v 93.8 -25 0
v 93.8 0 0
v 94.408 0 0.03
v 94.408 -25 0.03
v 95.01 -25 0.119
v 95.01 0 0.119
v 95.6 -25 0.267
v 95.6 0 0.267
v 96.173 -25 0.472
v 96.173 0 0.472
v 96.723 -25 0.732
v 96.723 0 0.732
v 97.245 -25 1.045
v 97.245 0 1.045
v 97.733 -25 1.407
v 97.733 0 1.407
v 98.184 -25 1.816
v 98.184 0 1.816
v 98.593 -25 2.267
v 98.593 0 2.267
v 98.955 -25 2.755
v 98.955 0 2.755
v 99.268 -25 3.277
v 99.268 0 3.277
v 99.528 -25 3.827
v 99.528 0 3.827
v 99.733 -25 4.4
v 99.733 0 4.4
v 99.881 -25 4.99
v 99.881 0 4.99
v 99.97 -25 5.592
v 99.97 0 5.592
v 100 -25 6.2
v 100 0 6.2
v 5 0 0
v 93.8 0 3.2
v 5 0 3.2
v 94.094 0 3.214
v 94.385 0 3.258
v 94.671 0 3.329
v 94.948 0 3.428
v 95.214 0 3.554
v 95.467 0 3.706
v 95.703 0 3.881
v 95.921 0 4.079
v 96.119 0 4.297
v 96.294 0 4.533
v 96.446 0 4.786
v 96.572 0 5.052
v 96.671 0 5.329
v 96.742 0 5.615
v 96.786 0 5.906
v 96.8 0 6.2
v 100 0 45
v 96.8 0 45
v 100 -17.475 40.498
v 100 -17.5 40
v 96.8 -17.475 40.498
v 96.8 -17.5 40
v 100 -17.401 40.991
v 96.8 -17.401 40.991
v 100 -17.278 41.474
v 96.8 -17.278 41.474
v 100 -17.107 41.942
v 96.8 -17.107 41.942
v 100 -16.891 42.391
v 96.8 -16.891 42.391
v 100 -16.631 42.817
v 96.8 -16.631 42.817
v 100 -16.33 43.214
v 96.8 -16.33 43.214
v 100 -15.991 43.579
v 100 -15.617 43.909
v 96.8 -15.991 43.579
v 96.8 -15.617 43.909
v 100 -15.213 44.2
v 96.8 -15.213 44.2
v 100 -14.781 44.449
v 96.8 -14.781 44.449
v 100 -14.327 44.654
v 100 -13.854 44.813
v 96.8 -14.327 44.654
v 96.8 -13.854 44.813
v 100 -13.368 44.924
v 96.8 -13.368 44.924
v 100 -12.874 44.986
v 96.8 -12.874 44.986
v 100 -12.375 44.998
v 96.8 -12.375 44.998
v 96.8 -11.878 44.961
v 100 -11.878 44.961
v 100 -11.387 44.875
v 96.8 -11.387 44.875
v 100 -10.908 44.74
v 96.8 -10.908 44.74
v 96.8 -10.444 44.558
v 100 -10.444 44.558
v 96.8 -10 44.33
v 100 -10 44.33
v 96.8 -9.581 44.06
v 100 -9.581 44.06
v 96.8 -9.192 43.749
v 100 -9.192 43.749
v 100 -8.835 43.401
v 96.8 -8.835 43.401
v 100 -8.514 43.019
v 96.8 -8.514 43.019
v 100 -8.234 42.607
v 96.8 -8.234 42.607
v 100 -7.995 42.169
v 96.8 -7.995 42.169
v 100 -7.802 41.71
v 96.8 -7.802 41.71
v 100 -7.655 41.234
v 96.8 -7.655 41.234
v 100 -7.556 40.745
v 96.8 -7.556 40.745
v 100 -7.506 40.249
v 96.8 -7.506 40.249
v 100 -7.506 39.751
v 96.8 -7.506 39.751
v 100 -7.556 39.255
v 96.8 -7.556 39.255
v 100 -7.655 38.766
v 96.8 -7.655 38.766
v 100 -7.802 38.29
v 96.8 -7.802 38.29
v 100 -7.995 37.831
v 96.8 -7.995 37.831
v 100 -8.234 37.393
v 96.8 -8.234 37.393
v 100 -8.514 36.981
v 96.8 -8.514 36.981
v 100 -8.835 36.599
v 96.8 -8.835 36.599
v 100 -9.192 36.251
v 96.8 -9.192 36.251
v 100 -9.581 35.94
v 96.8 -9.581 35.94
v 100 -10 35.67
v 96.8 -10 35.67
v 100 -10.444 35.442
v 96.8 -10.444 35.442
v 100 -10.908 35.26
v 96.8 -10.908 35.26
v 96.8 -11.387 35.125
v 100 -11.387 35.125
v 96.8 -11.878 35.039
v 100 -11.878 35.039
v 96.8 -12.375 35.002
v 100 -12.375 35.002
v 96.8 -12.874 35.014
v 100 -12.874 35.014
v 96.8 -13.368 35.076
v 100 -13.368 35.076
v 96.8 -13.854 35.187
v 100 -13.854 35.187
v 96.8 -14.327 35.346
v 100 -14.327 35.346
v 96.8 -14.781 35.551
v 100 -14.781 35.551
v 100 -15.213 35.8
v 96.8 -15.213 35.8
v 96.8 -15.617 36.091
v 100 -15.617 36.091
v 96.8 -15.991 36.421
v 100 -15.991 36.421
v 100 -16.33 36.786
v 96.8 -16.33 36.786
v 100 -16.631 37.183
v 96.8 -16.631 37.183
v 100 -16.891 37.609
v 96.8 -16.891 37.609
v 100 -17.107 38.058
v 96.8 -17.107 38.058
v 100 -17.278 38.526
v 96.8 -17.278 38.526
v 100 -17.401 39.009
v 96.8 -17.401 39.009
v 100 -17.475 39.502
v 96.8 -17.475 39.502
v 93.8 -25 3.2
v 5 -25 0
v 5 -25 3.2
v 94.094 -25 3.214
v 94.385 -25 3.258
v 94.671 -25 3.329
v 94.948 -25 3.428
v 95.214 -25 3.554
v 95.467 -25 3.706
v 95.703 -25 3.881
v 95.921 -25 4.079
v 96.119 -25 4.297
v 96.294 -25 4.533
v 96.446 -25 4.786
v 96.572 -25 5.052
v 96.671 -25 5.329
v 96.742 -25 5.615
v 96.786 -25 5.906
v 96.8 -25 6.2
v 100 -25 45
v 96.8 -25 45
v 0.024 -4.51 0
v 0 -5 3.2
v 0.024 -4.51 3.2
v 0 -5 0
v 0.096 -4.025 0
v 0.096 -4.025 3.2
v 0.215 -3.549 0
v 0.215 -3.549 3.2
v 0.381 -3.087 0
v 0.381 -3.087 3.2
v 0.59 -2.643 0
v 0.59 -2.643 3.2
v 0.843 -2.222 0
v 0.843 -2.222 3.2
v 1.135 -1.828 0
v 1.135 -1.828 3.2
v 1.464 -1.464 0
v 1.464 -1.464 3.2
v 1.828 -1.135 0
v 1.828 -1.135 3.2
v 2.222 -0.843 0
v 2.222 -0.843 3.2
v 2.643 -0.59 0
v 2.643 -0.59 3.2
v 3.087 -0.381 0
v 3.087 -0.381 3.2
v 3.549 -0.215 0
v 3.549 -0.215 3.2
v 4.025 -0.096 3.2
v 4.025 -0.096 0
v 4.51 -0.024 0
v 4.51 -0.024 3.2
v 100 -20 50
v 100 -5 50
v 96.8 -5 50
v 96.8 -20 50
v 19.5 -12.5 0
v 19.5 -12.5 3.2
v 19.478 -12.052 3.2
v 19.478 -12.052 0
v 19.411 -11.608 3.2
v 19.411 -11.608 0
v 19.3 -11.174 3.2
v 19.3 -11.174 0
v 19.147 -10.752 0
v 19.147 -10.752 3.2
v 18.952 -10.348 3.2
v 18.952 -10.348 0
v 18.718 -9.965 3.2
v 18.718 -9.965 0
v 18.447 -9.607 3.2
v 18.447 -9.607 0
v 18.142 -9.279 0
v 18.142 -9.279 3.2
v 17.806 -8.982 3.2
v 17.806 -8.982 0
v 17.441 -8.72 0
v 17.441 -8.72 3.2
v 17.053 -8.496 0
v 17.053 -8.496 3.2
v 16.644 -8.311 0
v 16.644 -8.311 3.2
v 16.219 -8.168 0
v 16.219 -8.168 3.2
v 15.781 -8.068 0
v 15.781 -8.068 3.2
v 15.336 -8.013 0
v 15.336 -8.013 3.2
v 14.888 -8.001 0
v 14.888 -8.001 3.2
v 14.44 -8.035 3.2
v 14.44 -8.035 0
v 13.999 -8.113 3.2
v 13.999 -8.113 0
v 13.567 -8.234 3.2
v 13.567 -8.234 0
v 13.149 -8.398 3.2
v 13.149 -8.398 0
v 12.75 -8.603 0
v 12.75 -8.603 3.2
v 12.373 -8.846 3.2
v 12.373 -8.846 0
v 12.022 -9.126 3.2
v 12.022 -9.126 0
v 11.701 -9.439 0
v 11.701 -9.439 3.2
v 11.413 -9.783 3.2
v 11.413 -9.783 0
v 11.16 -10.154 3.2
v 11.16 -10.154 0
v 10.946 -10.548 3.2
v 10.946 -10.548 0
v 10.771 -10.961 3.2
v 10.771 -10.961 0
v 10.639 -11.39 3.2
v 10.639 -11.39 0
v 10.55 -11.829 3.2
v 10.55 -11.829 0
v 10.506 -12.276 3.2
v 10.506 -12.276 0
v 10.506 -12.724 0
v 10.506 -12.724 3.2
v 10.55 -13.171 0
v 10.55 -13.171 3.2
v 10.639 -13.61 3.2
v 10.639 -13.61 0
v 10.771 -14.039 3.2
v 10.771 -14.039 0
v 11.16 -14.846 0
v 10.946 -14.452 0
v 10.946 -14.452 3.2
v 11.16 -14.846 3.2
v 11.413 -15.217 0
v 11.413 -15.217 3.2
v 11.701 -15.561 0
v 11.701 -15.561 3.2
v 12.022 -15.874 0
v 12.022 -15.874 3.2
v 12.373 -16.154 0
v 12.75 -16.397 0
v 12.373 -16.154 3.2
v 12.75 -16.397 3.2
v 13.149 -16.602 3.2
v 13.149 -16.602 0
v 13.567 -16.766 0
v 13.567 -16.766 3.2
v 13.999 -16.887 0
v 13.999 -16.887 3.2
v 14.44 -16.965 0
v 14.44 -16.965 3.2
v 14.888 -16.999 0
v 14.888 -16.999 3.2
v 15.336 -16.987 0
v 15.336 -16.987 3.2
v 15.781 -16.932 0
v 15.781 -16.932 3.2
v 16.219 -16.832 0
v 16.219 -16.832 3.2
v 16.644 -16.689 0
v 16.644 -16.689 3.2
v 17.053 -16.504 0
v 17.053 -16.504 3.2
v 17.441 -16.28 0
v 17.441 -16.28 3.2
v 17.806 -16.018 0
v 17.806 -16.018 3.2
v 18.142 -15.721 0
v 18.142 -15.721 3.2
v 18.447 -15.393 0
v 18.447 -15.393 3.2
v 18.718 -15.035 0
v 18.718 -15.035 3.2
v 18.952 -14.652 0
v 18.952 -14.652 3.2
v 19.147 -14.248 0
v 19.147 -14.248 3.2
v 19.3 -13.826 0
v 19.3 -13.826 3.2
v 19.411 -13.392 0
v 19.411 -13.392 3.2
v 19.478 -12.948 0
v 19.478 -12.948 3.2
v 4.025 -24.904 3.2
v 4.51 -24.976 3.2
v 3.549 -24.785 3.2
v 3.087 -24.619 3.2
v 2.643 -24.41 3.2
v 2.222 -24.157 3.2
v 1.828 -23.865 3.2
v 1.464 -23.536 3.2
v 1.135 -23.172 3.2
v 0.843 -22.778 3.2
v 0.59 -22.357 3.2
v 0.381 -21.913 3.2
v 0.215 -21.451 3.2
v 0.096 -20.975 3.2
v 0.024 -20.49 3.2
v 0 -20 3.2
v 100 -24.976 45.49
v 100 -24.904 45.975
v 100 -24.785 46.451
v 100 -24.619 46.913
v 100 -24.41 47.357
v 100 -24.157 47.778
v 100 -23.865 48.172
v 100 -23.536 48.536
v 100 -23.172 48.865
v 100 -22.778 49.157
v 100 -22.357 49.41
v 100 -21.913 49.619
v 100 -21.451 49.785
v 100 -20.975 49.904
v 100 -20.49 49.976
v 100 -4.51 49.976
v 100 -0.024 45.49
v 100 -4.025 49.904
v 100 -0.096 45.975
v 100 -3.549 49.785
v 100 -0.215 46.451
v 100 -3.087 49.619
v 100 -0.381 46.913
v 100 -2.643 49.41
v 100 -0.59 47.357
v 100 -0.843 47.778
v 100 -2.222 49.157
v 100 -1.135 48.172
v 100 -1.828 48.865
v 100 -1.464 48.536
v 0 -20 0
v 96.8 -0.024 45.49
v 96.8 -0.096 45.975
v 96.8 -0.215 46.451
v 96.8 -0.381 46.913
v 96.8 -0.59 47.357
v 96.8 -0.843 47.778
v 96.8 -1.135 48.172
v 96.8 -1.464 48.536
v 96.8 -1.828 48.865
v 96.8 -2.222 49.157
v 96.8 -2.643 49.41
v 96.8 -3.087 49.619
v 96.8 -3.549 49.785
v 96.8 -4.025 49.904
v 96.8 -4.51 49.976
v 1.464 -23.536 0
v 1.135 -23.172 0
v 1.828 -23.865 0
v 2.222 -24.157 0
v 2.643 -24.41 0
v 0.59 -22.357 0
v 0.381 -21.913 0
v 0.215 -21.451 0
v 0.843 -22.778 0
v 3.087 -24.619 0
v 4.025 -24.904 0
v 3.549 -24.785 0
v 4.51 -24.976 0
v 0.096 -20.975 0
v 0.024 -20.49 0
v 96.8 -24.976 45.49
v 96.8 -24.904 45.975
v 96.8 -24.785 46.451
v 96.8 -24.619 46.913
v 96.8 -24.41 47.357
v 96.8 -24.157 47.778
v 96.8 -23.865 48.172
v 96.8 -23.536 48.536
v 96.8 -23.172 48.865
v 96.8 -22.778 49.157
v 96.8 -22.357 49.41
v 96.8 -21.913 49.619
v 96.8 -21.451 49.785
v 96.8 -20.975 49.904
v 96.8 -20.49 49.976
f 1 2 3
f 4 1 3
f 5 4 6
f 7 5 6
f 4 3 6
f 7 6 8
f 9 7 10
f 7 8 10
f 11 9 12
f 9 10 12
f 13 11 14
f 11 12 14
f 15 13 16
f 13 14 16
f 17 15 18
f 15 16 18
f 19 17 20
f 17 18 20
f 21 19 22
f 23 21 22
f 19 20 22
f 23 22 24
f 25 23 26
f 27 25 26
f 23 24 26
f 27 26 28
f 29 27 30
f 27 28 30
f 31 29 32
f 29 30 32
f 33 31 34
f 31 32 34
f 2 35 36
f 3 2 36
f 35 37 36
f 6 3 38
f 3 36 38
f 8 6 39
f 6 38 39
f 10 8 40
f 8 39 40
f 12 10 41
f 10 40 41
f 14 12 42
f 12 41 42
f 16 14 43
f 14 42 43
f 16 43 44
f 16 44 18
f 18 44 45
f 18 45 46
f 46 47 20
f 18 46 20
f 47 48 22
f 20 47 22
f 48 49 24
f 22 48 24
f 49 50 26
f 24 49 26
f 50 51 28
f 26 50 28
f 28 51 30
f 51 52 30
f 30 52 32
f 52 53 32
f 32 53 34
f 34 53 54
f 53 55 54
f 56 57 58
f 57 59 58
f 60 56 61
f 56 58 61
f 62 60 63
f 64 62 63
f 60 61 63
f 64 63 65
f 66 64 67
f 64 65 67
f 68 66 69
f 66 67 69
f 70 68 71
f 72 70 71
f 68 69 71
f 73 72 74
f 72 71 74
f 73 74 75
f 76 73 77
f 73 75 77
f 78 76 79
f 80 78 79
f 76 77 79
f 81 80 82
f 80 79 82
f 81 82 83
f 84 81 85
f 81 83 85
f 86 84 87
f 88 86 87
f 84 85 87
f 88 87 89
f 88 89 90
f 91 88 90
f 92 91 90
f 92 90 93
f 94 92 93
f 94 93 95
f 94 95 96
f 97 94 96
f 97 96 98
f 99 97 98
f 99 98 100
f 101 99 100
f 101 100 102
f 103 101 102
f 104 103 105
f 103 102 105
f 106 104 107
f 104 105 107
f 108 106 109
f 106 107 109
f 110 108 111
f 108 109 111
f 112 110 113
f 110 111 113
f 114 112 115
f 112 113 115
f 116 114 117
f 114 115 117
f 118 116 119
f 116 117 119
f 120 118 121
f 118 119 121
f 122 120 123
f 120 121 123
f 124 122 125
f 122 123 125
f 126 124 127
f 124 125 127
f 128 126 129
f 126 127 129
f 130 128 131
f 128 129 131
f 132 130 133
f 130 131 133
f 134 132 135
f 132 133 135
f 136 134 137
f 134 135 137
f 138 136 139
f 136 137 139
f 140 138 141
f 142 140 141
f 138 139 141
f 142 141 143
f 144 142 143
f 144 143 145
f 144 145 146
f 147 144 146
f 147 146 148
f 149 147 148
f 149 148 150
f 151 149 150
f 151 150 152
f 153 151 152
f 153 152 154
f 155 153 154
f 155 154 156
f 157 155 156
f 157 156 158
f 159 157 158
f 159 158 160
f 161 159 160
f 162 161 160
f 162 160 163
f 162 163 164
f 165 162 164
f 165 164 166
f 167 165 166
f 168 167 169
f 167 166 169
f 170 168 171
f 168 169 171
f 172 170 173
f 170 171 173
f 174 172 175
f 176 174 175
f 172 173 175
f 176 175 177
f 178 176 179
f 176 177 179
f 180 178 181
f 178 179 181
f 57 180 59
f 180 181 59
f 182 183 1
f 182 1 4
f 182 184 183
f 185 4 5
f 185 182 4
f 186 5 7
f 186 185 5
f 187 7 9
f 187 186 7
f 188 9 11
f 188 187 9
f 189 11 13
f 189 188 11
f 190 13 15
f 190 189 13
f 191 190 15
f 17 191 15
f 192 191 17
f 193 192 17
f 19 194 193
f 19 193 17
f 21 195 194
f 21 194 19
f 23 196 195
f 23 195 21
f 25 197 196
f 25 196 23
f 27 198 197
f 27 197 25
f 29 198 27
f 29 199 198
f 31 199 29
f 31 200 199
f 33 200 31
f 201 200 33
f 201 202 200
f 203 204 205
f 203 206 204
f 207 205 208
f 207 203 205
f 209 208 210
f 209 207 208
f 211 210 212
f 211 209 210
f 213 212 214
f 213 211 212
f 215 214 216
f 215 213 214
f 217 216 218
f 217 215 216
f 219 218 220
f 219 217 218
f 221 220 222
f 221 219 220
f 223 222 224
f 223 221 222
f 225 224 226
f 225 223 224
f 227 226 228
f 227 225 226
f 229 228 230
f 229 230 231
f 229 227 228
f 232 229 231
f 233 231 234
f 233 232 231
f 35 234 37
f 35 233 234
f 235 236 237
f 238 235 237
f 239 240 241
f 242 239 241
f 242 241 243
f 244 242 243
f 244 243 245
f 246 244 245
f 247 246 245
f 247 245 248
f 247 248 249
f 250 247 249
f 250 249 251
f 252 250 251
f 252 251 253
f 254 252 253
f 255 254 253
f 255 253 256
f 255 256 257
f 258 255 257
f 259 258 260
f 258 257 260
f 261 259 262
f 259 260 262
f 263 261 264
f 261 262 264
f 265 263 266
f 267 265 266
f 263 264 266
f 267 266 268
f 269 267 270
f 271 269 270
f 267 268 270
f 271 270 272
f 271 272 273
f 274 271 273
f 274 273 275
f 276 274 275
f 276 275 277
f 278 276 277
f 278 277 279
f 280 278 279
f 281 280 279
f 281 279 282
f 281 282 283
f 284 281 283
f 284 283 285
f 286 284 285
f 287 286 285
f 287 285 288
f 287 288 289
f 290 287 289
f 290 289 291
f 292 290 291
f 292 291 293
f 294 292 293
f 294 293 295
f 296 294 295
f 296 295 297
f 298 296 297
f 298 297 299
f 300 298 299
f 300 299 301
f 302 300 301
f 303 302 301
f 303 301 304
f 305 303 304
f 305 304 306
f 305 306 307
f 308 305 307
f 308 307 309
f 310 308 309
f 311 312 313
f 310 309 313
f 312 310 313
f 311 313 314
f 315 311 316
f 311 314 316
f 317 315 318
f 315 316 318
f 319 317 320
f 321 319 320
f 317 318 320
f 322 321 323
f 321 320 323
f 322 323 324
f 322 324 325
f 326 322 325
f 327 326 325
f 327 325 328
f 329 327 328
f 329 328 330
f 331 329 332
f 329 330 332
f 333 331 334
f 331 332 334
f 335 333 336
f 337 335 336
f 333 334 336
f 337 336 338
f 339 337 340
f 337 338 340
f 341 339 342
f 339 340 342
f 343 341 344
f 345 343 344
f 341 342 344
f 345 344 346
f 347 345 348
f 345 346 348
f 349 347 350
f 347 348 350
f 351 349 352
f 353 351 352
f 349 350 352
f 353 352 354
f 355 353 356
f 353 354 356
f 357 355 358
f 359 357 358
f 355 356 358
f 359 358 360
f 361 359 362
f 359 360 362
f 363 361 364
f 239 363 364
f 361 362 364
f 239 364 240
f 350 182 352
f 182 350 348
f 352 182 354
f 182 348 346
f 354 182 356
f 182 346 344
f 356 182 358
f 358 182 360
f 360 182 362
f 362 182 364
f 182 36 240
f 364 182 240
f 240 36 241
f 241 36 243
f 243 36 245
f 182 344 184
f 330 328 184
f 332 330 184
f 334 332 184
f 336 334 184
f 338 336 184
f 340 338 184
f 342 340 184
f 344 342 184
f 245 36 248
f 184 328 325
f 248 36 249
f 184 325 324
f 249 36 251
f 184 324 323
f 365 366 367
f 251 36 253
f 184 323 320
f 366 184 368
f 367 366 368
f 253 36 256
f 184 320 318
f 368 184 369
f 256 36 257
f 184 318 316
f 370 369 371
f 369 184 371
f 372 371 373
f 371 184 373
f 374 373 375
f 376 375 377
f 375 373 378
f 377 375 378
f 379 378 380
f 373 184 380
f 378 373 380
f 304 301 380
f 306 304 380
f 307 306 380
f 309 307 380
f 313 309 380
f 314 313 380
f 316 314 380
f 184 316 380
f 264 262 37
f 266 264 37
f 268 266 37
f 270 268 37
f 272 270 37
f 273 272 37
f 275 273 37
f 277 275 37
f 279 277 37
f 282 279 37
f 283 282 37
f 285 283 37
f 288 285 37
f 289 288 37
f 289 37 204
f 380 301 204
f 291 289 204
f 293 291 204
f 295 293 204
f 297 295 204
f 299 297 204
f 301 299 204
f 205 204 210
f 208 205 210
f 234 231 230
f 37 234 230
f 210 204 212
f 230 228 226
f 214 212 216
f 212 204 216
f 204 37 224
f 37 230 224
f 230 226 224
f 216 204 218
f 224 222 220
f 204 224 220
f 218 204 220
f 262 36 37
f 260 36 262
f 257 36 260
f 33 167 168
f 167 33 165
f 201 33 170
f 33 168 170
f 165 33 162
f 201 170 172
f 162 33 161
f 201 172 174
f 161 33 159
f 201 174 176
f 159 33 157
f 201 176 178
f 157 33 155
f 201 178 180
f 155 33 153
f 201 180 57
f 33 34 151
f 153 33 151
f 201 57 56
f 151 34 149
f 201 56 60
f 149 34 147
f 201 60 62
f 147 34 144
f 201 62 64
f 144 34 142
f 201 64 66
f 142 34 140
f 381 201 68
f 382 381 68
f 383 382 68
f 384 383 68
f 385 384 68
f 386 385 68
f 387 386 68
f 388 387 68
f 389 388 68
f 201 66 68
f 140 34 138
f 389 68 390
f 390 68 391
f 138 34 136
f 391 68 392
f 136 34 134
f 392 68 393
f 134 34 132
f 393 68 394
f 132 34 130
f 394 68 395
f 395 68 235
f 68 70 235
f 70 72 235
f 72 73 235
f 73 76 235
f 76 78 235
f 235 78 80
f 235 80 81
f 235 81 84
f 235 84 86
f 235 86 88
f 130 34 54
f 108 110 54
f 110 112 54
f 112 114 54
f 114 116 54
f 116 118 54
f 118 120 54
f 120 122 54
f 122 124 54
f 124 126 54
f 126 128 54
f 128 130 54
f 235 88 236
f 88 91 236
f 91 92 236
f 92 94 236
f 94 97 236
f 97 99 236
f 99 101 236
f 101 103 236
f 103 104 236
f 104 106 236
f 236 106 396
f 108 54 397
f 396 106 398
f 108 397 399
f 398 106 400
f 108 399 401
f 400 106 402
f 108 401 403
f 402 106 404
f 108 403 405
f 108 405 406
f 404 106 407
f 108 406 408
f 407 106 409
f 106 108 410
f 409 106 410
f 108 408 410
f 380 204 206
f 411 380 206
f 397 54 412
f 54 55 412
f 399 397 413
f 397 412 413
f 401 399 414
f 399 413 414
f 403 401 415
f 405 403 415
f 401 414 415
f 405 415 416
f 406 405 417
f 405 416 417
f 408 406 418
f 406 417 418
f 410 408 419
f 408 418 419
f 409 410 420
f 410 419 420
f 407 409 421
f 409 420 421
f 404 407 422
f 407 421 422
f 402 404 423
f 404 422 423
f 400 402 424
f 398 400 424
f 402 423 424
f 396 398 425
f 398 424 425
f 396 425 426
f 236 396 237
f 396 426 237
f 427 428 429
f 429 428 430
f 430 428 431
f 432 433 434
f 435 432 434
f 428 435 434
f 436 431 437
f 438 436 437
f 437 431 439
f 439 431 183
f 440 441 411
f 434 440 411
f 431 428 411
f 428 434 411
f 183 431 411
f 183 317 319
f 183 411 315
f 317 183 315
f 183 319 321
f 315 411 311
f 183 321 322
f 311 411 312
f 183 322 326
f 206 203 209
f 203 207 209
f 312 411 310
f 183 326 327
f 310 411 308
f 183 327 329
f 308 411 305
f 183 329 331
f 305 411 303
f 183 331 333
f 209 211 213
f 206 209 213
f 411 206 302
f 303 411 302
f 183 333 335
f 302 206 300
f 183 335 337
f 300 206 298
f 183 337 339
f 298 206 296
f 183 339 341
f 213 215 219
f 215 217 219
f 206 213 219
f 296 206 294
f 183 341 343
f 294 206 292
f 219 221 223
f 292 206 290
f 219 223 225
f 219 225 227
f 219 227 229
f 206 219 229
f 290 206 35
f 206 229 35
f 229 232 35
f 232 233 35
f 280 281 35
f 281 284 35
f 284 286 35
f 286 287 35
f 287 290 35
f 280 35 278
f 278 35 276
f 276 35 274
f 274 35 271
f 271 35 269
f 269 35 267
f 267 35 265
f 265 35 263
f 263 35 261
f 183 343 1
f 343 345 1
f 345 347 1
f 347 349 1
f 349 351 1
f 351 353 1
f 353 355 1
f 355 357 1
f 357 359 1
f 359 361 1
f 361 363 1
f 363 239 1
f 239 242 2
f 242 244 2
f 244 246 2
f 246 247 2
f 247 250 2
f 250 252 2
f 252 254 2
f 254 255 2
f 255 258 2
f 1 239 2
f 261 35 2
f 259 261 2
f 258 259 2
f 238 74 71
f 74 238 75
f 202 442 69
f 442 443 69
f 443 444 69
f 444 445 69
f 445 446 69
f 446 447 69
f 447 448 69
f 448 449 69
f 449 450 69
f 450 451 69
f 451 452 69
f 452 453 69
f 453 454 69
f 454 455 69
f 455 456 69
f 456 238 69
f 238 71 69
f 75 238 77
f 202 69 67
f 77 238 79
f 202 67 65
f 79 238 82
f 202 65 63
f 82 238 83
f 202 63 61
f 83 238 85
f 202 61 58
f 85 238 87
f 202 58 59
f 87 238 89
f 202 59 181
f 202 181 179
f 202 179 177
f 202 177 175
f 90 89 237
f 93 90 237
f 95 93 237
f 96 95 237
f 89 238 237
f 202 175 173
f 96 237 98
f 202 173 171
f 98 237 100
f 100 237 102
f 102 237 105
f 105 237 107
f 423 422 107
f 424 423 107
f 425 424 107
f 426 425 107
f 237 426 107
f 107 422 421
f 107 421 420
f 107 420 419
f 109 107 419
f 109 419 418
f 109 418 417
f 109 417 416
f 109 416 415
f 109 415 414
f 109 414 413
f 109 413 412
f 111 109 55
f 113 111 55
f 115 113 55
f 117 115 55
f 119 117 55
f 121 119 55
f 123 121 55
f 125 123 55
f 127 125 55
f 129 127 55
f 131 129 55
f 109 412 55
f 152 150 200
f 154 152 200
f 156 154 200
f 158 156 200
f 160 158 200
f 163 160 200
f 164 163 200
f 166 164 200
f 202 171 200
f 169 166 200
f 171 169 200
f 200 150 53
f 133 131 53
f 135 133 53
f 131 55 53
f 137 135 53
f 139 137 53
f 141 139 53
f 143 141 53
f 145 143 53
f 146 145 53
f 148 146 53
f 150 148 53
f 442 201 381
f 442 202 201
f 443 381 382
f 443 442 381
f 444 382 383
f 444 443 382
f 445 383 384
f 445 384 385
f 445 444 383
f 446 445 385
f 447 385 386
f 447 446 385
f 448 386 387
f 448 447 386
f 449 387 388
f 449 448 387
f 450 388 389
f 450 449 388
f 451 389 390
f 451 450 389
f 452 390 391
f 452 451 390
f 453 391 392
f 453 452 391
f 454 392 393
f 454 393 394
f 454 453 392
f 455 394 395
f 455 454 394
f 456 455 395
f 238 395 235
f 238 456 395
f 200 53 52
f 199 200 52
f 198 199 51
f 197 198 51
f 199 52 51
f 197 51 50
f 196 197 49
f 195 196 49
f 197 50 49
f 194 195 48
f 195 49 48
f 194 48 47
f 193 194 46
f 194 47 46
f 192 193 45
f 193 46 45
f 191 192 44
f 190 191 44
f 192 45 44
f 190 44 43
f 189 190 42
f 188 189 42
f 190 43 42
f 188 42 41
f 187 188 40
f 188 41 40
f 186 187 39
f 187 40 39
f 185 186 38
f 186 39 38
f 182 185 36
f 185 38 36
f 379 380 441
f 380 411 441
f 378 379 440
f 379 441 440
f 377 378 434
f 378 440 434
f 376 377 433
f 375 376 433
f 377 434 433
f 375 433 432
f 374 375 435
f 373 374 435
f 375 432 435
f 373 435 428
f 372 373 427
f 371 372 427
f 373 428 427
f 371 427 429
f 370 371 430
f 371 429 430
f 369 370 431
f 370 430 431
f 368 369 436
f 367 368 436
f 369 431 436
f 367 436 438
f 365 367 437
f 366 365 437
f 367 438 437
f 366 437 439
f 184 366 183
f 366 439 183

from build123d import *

# Parameters (mm, degrees)
F1_DEPTH = 25
F2_R     = 5
F3_DEPTH = 12.5
F4_R     = 4.5
F5_DEPTH = 3.201
F6_R     = 5


with BuildPart() as f1:
    # F0 (on Front) → F1 (new body)
    with BuildSketch(Plane.XZ):
        with BuildLine():
            Line((0, 3.2), (0, 0))
            Line((0, 0), (93.8, 0))
            ThreePointArc((93.8, 0), (98.184062, 1.815938), (100, 6.2))
            Line((100, 6.2), (100, 50))
            Line((100, 50), (96.8, 50))
            Line((96.8, 50), (96.8, 6.2))
            ThreePointArc((96.8, 6.2), (95.92132, 4.07868), (93.8, 3.2))
            Line((93.8, 3.2), (0, 3.2))
        make_face()
    extrude(amount=F1_DEPTH)

    # F2 (on face) → F3 (cut, symmetric)
    with BuildSketch(Plane(origin=(96.8, 0, 0), x_dir=(0, -1, 0), z_dir=(-1, 0, 0))):
        with Locations((12.5, 40)):
            Circle(F2_R)
    extrude(amount=F3_DEPTH, both=True, mode=Mode.SUBTRACT)

    # F4 (on face) → F5 (cut, through all)
    with BuildSketch(Plane.XY.offset(3.2)):
        with Locations((15, -12.5)):
            Circle(F4_R)
    extrude(amount=-F5_DEPTH, mode=Mode.SUBTRACT)

    # F6
    f6_edges = [f1.edges().sort_by_distance(p)[0] for p in [
        (0, -25, 1.6),
        (0, 0, 1.6),
        (98.4, 0, 50),
        (98.4, -25, 50),
    ]]
    fillet(f6_edges, radius=F6_R)


solid = f1.part
